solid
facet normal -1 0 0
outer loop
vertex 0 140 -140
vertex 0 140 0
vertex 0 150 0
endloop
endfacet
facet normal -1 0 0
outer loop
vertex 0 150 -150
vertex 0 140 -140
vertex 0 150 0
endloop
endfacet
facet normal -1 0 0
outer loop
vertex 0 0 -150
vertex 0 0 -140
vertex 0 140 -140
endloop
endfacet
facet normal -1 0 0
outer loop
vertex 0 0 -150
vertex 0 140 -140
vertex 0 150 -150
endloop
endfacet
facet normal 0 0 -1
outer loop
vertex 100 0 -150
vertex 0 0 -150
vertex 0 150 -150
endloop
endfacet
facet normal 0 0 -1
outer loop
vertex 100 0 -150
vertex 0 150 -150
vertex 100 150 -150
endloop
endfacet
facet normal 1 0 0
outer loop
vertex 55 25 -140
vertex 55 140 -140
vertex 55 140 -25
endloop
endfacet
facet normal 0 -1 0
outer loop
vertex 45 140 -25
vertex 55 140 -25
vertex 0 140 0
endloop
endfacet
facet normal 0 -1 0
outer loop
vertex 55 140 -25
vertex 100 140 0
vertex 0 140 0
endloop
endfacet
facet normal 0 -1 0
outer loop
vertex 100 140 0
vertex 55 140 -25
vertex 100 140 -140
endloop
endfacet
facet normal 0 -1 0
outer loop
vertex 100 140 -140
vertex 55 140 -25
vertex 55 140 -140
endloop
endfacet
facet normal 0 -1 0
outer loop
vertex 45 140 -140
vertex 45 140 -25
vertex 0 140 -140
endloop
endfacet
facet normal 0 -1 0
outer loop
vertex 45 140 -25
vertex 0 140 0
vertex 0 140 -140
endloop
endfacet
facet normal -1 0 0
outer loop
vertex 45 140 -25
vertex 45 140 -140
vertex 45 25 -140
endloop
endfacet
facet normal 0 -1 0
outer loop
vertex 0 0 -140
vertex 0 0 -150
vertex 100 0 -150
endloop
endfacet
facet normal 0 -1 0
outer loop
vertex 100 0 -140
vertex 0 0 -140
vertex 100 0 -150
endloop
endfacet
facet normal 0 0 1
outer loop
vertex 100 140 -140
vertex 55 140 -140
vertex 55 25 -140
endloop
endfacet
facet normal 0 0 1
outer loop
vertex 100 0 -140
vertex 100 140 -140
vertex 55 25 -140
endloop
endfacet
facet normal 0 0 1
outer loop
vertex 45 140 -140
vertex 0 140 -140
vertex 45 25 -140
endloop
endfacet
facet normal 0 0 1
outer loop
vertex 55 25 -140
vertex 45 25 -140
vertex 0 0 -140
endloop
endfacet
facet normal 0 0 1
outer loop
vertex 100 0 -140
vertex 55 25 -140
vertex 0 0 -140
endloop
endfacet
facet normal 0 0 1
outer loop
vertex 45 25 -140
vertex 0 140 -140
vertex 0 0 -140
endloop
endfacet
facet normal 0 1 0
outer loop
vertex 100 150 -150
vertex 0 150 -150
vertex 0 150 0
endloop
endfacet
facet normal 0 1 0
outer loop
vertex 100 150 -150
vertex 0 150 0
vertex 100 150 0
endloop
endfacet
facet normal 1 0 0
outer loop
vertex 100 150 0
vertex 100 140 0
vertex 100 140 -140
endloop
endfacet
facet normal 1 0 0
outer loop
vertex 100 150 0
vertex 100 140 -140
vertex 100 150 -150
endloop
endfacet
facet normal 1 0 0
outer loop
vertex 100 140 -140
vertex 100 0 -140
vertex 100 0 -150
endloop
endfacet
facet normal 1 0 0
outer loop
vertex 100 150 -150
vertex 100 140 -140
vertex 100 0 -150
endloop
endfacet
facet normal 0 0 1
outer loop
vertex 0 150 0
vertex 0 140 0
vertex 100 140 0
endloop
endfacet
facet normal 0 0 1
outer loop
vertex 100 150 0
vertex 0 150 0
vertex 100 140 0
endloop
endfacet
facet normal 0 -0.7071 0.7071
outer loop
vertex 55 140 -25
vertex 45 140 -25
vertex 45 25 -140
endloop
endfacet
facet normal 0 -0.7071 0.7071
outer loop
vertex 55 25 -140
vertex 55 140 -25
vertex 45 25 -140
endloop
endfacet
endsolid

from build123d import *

# Parameters (mm, degrees)
SKETCH2_W           = 100
SKETCH2_H           = 150
BOSS_EXTRUDE1_DEPTH = 150
CUT_EXTRUDE1_DEPTH  = 235.520787991
CUT_EXTRUDE2_DEPTH  = 45


with BuildPart() as part:
    # Sketch2 → Boss-Extrude1 (new body)
    with BuildSketch(Plane(origin=(0, 0, 0), x_dir=(1, 0, 0), z_dir=(0, 1, 0))):
        with Locations((50, 75)):
            Rectangle(SKETCH2_W, SKETCH2_H)
    extrude(amount=BOSS_EXTRUDE1_DEPTH)

    # Sketch3 → Cut-Extrude1 (cut, through all)
    with BuildSketch(Plane.ZY):
        Polygon((0, 140), (-25, 140), (-140, 25), (-140, 0), (0, 0), align=None)
    extrude(amount=-CUT_EXTRUDE1_DEPTH, mode=Mode.SUBTRACT)

    # Sketch4 → Cut-Extrude2 (cut)
    with BuildSketch(Plane.ZY):
        Polygon((-140, 25), (-25, 140), (-140, 140), align=None)
    cut_extrude2 = extrude(amount=-CUT_EXTRUDE2_DEPTH, mode=Mode.SUBTRACT)

    # Mirror1: Cut-Extrude2 across plane
    add(cut_extrude2.mirror(Plane(origin=(50, 0, 0), x_dir=(0, 0, 1), z_dir=(1, 0, 0))), mode=Mode.SUBTRACT)


solid = part.part
